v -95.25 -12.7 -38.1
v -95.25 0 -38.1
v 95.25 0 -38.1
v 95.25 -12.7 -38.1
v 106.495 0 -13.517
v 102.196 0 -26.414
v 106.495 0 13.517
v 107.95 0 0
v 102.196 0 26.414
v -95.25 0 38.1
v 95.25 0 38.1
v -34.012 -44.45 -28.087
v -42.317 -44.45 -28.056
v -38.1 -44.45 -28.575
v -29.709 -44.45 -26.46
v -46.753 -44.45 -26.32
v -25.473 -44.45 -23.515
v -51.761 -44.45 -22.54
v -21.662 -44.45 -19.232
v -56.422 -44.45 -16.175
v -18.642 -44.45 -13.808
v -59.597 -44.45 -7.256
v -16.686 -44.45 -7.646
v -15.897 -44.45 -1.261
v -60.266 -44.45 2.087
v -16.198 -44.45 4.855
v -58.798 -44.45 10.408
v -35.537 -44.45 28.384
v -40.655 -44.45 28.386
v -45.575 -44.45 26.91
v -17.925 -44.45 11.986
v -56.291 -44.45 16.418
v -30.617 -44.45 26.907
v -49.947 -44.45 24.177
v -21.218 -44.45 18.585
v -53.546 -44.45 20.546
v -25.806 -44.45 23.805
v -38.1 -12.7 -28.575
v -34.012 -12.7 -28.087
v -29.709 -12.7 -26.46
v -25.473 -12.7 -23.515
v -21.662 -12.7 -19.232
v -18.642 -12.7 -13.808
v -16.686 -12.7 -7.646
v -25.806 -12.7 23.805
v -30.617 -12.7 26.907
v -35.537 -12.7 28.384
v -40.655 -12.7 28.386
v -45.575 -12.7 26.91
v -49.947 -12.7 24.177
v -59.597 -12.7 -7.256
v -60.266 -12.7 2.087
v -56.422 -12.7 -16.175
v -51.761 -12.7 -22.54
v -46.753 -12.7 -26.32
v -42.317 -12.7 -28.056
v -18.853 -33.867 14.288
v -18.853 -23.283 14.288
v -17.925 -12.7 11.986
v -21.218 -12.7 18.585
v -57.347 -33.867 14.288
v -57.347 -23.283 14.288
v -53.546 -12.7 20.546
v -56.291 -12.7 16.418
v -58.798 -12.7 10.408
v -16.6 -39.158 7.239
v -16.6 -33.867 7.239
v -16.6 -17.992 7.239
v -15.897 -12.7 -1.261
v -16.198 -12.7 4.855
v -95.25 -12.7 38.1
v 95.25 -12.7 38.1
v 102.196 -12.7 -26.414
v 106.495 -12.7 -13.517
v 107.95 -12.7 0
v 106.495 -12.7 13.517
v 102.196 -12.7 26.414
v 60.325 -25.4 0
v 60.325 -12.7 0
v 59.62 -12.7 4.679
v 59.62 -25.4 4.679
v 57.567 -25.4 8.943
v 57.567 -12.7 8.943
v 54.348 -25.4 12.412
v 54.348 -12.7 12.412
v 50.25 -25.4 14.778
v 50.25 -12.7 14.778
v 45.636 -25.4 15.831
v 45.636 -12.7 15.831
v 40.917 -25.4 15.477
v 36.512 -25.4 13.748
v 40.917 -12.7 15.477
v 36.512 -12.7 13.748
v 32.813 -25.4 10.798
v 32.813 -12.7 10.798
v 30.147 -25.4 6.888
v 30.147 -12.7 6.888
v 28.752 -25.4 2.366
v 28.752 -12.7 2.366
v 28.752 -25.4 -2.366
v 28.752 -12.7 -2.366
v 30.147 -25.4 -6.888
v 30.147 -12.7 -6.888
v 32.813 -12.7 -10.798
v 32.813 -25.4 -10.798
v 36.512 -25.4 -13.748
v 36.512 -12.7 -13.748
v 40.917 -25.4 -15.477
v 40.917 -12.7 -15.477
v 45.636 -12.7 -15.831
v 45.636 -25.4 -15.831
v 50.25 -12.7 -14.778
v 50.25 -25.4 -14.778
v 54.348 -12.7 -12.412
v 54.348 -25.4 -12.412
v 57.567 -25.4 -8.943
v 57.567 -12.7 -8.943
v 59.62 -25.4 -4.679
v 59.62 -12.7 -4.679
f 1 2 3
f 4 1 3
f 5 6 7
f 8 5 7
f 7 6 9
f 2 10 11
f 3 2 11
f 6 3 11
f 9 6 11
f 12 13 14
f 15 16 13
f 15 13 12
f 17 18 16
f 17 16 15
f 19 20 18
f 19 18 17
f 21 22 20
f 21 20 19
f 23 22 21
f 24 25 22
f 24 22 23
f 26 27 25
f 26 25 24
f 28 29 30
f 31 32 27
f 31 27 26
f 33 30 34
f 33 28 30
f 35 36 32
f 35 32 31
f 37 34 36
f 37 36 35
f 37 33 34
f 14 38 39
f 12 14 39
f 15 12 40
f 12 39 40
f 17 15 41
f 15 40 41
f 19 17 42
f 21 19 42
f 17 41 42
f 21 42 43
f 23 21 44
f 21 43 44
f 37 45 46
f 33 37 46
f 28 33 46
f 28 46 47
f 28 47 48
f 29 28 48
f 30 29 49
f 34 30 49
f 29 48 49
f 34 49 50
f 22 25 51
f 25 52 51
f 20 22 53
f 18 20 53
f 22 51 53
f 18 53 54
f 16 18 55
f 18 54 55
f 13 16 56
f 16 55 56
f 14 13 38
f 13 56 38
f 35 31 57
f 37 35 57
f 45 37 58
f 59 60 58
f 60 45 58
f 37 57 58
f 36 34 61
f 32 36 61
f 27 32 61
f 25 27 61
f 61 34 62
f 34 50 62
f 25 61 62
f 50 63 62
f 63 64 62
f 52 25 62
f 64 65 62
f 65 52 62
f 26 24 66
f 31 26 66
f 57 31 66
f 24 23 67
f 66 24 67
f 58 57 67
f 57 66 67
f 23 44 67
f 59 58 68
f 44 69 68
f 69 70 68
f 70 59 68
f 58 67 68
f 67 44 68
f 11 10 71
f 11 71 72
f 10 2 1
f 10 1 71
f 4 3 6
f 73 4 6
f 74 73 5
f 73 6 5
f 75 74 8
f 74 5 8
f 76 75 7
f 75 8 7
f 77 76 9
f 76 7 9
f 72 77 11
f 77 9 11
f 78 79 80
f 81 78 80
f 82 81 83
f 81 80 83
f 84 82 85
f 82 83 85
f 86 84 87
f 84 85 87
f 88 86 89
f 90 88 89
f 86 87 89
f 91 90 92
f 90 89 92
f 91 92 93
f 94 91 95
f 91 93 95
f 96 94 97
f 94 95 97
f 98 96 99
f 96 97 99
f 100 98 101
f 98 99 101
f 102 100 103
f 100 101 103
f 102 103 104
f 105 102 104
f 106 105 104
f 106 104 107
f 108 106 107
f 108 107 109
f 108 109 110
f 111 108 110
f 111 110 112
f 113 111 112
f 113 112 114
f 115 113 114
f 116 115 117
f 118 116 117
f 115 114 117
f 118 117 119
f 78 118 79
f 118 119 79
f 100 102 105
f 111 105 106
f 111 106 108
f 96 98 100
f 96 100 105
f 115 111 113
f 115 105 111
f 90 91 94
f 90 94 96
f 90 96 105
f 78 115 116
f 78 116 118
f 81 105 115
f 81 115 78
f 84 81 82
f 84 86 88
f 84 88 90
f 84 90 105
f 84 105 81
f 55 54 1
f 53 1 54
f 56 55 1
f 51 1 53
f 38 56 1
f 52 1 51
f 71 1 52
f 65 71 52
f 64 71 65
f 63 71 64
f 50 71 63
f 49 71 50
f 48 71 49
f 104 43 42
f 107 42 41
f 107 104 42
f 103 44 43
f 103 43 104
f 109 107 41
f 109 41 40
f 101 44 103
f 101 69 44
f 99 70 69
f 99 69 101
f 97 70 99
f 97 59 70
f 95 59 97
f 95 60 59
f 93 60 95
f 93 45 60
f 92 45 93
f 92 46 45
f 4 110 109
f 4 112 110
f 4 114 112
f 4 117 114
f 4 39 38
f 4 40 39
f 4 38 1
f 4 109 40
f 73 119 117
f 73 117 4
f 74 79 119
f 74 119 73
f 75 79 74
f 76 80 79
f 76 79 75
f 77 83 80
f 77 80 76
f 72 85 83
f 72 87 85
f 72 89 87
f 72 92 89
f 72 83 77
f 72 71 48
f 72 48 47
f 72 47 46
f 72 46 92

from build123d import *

# Parameters (mm, degrees)
F0_W     = 190.5
F0_H     = 76.2
F1_DEPTH = 12.7
F3_DEPTH = 31.75
F4_R     = 15.875
F5_DEPTH = 12.7


with BuildPart() as f1:
    # F0 (on Front) → F1 (new body)
    with BuildSketch(Plane.XZ):
        Rectangle(F0_W, F0_H)
        with BuildLine():
            Line((95.25, 38.1), (95.25, -38.1))
            ThreePointArc((95.25, -38.1), (107.95, 0), (95.25, 38.1))
        make_face()
    extrude(amount=F1_DEPTH)

    # F2 (on face) → F3 (join)
    with BuildSketch(Plane.XZ.offset(12.7)):
        with BuildLine():
            add(Edge.make_bspline(
                [(-38.1, -28.575), (0.394829, -28.575), (-18.852585, 14.2875), (-38.1, 57.15), (-57.347415, 14.2875), (-76.594829, -28.575), (-38.1, -28.575)],
                knots=[0, 0, 0, 2.094395, 2.094395, 4.18879, 4.18879, 6.283185, 6.283185, 6.283185], degree=2, weights=[1, 0.5, 1, 0.5, 1, 0.5, 1]))
        make_face()
    extrude(amount=F3_DEPTH)

    # F4 (on face) → F5 (join)
    with BuildSketch(Plane.XZ.offset(12.7)):
        with Locations((44.45, 0)):
            Circle(F4_R)
    extrude(amount=F5_DEPTH)


solid = f1.part
